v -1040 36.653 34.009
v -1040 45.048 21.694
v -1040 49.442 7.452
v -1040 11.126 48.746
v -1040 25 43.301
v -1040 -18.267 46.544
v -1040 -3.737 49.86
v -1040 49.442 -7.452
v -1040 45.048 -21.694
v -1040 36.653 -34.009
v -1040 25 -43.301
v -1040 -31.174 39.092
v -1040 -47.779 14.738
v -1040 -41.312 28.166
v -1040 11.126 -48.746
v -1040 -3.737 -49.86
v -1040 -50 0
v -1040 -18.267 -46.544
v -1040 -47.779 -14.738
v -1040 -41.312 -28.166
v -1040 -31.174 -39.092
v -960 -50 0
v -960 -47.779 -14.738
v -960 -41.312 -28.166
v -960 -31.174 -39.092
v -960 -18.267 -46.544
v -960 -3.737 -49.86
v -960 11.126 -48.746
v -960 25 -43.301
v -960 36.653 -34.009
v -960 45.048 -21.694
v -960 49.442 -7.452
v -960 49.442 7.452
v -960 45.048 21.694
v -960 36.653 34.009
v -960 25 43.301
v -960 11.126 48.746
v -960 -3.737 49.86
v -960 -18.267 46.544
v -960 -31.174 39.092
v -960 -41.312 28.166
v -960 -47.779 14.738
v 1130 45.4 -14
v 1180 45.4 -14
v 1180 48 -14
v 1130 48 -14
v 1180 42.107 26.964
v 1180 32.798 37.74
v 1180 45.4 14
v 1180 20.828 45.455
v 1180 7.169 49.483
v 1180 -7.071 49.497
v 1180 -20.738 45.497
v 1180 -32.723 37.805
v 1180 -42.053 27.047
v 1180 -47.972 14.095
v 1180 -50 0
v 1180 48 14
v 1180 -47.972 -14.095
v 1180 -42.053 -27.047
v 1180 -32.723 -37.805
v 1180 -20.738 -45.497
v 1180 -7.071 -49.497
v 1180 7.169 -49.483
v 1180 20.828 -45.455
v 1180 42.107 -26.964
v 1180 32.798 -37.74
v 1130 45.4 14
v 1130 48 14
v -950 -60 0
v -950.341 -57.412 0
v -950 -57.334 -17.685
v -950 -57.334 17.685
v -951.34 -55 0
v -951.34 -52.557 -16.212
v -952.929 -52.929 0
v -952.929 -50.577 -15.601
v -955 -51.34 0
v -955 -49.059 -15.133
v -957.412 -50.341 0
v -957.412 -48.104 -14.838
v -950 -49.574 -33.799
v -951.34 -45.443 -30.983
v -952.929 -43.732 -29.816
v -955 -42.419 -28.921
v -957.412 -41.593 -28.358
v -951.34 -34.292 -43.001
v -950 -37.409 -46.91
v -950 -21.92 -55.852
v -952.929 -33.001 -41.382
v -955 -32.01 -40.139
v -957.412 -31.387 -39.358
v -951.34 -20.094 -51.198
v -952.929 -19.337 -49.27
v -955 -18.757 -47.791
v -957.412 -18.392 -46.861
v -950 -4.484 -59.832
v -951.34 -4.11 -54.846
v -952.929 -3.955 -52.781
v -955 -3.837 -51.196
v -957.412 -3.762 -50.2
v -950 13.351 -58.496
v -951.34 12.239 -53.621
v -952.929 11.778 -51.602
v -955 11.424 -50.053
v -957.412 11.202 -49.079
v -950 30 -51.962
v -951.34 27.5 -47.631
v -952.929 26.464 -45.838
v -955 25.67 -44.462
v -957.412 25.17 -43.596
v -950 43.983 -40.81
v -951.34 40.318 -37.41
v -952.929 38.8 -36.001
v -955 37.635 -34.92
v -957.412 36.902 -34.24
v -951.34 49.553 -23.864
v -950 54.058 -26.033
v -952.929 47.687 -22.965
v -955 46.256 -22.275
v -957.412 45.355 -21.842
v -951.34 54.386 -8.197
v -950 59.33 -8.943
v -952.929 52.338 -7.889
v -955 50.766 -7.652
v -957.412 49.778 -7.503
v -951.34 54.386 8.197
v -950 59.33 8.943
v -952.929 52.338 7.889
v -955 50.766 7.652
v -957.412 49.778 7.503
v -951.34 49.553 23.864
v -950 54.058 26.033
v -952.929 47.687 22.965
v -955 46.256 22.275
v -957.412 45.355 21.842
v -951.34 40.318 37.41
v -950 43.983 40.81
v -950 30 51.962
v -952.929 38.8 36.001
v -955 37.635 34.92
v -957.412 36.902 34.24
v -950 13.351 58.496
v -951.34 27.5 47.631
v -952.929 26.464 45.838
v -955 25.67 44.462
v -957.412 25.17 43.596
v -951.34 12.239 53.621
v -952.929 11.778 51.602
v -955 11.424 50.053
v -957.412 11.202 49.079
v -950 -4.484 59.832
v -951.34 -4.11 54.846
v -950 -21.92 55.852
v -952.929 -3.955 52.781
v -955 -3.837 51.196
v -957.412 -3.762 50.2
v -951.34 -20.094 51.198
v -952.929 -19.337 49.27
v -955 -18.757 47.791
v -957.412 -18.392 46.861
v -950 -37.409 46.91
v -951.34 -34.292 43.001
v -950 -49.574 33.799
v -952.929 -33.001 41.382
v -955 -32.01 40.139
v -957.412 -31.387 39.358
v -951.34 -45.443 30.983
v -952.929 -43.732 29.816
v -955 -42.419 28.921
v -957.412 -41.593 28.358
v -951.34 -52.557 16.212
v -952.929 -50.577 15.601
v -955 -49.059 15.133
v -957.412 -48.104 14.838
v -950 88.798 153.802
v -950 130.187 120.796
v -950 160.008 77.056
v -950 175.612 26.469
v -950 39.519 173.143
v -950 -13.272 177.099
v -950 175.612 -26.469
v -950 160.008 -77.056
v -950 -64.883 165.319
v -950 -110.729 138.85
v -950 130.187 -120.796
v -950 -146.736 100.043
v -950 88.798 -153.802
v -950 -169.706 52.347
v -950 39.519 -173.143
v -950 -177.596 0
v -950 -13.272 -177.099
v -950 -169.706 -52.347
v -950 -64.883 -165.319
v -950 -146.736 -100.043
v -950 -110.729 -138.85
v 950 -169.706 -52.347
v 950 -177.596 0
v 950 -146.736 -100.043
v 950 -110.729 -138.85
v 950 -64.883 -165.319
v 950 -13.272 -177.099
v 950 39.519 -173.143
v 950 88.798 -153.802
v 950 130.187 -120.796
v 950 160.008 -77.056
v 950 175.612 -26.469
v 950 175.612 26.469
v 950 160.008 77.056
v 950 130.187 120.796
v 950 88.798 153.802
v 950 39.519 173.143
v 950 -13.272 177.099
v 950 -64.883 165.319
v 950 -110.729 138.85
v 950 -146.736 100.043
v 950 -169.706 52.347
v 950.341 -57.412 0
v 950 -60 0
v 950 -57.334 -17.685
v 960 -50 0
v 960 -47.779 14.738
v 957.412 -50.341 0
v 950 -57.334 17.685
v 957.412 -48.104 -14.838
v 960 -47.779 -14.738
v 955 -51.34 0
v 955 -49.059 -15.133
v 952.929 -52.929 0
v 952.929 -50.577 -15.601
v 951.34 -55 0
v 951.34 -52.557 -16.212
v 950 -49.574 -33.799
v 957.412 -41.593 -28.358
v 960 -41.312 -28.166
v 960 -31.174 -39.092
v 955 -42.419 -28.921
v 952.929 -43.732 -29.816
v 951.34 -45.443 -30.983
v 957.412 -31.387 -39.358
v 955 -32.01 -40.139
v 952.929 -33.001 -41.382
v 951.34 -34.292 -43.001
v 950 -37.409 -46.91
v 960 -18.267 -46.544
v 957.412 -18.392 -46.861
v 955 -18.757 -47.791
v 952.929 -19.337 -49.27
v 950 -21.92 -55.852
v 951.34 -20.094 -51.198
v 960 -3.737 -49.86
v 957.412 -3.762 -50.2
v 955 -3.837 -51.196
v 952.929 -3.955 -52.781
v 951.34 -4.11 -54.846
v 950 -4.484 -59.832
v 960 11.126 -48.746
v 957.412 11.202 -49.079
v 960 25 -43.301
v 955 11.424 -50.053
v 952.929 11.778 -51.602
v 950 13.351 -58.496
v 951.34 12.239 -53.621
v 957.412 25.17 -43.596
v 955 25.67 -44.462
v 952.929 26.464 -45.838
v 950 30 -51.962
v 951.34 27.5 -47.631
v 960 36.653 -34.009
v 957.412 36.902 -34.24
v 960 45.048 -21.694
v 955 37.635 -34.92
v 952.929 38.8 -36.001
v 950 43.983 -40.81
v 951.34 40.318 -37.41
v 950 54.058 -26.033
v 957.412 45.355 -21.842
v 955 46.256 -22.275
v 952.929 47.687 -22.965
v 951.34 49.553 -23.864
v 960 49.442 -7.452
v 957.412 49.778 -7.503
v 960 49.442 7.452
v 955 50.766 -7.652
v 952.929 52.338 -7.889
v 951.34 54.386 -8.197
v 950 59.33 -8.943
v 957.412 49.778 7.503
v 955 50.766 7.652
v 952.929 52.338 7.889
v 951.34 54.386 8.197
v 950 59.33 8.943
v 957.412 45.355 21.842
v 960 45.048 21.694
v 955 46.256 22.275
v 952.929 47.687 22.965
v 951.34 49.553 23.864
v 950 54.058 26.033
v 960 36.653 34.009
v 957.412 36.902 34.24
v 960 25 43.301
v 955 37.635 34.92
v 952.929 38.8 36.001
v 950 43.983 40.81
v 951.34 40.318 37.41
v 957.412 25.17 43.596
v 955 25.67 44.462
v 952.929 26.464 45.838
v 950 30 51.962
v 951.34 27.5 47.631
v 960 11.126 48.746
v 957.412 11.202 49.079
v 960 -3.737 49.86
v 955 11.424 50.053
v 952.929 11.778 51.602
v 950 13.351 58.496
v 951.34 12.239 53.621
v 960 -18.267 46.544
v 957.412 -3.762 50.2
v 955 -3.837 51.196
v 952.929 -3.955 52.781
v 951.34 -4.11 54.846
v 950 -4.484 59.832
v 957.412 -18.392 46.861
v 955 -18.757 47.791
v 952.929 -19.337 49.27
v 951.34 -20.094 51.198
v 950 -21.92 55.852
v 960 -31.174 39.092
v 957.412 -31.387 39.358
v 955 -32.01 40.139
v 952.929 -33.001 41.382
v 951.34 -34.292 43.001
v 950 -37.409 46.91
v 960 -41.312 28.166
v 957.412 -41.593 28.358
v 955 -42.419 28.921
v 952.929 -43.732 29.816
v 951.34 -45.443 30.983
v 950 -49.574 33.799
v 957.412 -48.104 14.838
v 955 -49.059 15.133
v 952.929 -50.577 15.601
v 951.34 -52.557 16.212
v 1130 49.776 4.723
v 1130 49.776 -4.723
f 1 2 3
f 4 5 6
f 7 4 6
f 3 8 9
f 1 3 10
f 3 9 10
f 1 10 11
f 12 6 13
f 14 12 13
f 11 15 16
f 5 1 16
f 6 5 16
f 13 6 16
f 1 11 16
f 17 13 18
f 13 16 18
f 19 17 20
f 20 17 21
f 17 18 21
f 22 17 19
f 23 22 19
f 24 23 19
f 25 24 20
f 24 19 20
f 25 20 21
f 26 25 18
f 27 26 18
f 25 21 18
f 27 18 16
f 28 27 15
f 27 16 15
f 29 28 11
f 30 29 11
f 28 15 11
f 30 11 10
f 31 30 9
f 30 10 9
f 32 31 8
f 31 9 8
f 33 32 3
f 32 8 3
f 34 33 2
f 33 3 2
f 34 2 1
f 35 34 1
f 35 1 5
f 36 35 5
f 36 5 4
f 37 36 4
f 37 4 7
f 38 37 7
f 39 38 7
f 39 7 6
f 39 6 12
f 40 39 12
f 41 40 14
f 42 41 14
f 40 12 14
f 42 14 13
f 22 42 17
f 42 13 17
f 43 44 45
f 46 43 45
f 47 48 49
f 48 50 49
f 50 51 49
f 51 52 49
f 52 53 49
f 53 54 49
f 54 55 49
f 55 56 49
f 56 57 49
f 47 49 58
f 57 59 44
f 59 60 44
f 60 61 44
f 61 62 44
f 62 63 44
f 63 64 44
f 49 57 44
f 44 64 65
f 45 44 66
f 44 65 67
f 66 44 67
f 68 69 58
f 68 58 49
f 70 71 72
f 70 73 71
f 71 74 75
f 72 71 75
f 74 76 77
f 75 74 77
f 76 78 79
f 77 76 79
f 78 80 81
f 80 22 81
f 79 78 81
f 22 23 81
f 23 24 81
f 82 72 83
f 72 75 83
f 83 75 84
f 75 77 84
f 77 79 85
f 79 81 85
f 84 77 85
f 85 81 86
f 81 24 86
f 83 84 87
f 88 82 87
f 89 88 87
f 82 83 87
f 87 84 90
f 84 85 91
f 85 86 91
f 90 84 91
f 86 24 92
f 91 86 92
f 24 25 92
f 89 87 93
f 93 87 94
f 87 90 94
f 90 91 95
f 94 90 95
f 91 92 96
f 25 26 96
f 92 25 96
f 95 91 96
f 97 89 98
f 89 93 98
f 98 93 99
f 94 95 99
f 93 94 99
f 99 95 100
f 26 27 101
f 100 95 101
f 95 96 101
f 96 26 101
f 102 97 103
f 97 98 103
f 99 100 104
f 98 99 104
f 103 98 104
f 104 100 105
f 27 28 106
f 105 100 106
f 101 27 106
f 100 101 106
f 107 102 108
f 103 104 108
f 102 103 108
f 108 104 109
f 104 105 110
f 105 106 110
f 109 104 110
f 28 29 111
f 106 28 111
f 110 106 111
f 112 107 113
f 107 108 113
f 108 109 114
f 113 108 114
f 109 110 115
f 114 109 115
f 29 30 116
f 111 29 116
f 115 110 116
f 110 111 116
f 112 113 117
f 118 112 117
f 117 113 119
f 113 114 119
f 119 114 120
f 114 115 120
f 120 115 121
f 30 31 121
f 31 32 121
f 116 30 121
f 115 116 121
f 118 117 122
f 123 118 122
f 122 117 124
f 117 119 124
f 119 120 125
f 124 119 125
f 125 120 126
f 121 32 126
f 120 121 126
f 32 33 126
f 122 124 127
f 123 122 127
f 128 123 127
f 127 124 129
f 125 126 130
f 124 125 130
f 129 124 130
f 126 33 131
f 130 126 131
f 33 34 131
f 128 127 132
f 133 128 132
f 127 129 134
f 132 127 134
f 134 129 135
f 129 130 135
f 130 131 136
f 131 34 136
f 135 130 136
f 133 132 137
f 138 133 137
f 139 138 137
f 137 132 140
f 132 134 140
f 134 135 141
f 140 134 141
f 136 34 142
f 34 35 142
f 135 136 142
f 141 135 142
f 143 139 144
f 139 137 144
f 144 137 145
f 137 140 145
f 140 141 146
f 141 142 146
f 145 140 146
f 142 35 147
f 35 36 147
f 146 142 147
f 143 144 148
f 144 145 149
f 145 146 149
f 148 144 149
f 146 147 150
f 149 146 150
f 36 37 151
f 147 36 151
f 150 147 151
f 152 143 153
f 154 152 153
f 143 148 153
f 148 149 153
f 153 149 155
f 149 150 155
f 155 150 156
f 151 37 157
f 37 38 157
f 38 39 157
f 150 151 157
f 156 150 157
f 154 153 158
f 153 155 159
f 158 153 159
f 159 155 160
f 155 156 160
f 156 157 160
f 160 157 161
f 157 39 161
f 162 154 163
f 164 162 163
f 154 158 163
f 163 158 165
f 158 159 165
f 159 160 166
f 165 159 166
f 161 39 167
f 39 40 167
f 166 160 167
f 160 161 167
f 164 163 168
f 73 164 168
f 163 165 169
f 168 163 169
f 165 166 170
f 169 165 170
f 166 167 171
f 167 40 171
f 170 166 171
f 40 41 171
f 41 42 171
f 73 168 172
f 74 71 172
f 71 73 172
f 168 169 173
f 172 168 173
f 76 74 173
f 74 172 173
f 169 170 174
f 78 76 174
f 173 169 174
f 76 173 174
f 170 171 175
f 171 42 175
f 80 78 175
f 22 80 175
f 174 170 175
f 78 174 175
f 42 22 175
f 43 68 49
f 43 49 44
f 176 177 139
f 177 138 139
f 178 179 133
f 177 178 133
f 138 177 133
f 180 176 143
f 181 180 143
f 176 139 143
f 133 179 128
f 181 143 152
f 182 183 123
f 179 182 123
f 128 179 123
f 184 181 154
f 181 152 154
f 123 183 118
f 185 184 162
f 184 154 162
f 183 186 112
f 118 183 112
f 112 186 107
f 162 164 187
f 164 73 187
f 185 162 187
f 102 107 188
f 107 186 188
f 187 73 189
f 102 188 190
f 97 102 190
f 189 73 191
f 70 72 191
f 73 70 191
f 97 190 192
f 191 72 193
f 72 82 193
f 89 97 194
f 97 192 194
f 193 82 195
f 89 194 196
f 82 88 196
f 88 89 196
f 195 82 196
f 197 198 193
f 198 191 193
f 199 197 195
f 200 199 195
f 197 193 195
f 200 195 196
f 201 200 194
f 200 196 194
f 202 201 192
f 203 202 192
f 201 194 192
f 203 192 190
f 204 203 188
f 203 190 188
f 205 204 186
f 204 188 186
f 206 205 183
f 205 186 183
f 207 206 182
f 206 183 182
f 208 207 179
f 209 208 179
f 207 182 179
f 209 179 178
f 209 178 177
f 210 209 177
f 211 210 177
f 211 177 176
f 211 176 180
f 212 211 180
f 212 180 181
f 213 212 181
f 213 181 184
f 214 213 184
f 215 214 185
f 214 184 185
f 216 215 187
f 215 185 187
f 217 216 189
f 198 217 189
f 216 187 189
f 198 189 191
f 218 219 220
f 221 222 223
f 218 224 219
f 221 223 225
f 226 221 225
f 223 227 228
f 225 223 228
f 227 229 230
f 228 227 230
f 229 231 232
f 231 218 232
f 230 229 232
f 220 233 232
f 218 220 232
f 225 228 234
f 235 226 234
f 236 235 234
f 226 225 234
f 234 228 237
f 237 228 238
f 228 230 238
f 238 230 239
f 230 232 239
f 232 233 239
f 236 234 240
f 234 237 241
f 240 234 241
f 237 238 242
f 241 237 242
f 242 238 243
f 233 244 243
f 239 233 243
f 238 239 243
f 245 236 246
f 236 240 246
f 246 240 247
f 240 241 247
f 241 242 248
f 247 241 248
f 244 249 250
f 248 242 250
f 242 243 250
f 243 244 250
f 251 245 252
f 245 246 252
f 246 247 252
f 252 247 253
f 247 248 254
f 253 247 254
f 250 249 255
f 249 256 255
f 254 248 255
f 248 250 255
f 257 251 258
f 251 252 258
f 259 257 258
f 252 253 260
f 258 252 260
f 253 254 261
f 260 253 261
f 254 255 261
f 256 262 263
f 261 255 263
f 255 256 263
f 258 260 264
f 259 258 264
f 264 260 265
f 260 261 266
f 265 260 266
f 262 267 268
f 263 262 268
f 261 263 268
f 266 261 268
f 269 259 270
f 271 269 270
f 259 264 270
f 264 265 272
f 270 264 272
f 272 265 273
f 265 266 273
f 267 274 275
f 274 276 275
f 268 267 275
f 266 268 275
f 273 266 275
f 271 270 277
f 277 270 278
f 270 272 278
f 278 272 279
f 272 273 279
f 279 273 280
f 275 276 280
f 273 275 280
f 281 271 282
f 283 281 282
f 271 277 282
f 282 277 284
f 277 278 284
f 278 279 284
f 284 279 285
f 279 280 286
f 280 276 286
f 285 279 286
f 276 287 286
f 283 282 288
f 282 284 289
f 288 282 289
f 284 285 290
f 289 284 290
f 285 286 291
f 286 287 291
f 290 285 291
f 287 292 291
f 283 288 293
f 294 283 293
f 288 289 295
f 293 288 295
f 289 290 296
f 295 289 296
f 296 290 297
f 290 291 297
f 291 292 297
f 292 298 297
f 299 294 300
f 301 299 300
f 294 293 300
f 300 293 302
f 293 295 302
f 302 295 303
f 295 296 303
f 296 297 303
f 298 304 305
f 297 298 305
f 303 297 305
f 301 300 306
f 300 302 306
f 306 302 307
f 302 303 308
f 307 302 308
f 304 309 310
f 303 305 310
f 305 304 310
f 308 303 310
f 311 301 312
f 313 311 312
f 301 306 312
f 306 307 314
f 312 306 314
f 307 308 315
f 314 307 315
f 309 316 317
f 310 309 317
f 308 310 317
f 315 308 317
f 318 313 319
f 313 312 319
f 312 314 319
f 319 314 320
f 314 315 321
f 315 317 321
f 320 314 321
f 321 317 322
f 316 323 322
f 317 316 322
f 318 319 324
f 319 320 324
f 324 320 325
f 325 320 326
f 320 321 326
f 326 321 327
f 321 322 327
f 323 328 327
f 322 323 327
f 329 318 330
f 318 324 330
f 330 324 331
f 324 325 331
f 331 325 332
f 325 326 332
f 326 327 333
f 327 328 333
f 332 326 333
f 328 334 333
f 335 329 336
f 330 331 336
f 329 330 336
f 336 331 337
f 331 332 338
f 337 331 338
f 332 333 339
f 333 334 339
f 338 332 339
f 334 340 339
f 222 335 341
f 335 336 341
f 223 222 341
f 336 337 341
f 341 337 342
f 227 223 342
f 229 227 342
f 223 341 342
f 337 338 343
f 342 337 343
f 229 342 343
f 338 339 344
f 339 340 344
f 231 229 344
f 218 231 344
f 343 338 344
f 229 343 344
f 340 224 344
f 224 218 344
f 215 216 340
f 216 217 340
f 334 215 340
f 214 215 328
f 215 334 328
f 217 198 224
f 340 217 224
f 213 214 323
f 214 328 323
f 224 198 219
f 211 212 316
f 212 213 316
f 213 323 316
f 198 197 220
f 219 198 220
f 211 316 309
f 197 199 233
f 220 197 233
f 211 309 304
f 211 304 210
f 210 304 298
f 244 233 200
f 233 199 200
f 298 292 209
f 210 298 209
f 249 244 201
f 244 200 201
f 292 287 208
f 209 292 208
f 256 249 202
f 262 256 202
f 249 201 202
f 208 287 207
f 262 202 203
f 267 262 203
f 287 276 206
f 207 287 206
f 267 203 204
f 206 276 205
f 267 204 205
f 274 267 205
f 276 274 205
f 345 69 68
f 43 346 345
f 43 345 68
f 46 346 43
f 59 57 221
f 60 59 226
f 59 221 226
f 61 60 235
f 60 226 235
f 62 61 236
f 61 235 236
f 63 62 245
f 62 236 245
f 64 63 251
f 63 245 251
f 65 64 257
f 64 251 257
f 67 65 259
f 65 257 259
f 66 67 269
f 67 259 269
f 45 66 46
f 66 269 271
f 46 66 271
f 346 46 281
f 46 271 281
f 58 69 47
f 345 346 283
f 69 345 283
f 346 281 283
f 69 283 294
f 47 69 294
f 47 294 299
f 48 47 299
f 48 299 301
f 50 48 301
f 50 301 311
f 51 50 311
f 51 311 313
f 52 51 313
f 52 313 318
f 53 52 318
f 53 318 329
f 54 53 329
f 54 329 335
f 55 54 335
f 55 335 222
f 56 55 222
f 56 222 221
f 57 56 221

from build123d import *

# Parameters (mm, degrees)
FILLET1_R          = 10
CUT_EXTRUDE1_START = -50
CUT_EXTRUDE1_DEPTH = 50


with BuildPart() as part:
    # Sketch1 → Revolve1 (revolve)
    with BuildSketch(Plane.XY, mode=Mode.PRIVATE) as revolve1_sk:
        Polygon((-1040, 0), (1180, 0), (1180, 50), (950, 50), (950, 177.595701724), (0, 177.595701724), (-950, 177.595701724), (-950, 50), (-1040, 50), align=None)
    revolve(revolve1_sk.sketch.rotate(Axis((-1040, 0, 0), (1, 0, 0)), 180), axis=Axis((-1040, 0, 0), (1, 0, 0)))

    # Fillet1
    fillet1_edges = [part.edges().sort_by_distance(p)[0] for p in [
        (950, 50, 0),
        (-950, 50, 0),
    ]]
    fillet(fillet1_edges, radius=FILLET1_R)

    # Sketch2 → Cut-Extrude1 (cut)
    with BuildSketch(Plane(origin=(1180, 0, 0), x_dir=(0, 0, -1), z_dir=(1, 0, 0)).offset(CUT_EXTRUDE1_START)):
        with BuildLine():
            ThreePointArc((14, 48), (0, 50), (-14, 48))
            Line((-14, 48), (-14, 45.4))
            Line((-14, 45.4), (14, 45.4))
            Line((14, 45.4), (14, 48))
        make_face()
    extrude(amount=CUT_EXTRUDE1_DEPTH, mode=Mode.SUBTRACT)


solid = part.part
